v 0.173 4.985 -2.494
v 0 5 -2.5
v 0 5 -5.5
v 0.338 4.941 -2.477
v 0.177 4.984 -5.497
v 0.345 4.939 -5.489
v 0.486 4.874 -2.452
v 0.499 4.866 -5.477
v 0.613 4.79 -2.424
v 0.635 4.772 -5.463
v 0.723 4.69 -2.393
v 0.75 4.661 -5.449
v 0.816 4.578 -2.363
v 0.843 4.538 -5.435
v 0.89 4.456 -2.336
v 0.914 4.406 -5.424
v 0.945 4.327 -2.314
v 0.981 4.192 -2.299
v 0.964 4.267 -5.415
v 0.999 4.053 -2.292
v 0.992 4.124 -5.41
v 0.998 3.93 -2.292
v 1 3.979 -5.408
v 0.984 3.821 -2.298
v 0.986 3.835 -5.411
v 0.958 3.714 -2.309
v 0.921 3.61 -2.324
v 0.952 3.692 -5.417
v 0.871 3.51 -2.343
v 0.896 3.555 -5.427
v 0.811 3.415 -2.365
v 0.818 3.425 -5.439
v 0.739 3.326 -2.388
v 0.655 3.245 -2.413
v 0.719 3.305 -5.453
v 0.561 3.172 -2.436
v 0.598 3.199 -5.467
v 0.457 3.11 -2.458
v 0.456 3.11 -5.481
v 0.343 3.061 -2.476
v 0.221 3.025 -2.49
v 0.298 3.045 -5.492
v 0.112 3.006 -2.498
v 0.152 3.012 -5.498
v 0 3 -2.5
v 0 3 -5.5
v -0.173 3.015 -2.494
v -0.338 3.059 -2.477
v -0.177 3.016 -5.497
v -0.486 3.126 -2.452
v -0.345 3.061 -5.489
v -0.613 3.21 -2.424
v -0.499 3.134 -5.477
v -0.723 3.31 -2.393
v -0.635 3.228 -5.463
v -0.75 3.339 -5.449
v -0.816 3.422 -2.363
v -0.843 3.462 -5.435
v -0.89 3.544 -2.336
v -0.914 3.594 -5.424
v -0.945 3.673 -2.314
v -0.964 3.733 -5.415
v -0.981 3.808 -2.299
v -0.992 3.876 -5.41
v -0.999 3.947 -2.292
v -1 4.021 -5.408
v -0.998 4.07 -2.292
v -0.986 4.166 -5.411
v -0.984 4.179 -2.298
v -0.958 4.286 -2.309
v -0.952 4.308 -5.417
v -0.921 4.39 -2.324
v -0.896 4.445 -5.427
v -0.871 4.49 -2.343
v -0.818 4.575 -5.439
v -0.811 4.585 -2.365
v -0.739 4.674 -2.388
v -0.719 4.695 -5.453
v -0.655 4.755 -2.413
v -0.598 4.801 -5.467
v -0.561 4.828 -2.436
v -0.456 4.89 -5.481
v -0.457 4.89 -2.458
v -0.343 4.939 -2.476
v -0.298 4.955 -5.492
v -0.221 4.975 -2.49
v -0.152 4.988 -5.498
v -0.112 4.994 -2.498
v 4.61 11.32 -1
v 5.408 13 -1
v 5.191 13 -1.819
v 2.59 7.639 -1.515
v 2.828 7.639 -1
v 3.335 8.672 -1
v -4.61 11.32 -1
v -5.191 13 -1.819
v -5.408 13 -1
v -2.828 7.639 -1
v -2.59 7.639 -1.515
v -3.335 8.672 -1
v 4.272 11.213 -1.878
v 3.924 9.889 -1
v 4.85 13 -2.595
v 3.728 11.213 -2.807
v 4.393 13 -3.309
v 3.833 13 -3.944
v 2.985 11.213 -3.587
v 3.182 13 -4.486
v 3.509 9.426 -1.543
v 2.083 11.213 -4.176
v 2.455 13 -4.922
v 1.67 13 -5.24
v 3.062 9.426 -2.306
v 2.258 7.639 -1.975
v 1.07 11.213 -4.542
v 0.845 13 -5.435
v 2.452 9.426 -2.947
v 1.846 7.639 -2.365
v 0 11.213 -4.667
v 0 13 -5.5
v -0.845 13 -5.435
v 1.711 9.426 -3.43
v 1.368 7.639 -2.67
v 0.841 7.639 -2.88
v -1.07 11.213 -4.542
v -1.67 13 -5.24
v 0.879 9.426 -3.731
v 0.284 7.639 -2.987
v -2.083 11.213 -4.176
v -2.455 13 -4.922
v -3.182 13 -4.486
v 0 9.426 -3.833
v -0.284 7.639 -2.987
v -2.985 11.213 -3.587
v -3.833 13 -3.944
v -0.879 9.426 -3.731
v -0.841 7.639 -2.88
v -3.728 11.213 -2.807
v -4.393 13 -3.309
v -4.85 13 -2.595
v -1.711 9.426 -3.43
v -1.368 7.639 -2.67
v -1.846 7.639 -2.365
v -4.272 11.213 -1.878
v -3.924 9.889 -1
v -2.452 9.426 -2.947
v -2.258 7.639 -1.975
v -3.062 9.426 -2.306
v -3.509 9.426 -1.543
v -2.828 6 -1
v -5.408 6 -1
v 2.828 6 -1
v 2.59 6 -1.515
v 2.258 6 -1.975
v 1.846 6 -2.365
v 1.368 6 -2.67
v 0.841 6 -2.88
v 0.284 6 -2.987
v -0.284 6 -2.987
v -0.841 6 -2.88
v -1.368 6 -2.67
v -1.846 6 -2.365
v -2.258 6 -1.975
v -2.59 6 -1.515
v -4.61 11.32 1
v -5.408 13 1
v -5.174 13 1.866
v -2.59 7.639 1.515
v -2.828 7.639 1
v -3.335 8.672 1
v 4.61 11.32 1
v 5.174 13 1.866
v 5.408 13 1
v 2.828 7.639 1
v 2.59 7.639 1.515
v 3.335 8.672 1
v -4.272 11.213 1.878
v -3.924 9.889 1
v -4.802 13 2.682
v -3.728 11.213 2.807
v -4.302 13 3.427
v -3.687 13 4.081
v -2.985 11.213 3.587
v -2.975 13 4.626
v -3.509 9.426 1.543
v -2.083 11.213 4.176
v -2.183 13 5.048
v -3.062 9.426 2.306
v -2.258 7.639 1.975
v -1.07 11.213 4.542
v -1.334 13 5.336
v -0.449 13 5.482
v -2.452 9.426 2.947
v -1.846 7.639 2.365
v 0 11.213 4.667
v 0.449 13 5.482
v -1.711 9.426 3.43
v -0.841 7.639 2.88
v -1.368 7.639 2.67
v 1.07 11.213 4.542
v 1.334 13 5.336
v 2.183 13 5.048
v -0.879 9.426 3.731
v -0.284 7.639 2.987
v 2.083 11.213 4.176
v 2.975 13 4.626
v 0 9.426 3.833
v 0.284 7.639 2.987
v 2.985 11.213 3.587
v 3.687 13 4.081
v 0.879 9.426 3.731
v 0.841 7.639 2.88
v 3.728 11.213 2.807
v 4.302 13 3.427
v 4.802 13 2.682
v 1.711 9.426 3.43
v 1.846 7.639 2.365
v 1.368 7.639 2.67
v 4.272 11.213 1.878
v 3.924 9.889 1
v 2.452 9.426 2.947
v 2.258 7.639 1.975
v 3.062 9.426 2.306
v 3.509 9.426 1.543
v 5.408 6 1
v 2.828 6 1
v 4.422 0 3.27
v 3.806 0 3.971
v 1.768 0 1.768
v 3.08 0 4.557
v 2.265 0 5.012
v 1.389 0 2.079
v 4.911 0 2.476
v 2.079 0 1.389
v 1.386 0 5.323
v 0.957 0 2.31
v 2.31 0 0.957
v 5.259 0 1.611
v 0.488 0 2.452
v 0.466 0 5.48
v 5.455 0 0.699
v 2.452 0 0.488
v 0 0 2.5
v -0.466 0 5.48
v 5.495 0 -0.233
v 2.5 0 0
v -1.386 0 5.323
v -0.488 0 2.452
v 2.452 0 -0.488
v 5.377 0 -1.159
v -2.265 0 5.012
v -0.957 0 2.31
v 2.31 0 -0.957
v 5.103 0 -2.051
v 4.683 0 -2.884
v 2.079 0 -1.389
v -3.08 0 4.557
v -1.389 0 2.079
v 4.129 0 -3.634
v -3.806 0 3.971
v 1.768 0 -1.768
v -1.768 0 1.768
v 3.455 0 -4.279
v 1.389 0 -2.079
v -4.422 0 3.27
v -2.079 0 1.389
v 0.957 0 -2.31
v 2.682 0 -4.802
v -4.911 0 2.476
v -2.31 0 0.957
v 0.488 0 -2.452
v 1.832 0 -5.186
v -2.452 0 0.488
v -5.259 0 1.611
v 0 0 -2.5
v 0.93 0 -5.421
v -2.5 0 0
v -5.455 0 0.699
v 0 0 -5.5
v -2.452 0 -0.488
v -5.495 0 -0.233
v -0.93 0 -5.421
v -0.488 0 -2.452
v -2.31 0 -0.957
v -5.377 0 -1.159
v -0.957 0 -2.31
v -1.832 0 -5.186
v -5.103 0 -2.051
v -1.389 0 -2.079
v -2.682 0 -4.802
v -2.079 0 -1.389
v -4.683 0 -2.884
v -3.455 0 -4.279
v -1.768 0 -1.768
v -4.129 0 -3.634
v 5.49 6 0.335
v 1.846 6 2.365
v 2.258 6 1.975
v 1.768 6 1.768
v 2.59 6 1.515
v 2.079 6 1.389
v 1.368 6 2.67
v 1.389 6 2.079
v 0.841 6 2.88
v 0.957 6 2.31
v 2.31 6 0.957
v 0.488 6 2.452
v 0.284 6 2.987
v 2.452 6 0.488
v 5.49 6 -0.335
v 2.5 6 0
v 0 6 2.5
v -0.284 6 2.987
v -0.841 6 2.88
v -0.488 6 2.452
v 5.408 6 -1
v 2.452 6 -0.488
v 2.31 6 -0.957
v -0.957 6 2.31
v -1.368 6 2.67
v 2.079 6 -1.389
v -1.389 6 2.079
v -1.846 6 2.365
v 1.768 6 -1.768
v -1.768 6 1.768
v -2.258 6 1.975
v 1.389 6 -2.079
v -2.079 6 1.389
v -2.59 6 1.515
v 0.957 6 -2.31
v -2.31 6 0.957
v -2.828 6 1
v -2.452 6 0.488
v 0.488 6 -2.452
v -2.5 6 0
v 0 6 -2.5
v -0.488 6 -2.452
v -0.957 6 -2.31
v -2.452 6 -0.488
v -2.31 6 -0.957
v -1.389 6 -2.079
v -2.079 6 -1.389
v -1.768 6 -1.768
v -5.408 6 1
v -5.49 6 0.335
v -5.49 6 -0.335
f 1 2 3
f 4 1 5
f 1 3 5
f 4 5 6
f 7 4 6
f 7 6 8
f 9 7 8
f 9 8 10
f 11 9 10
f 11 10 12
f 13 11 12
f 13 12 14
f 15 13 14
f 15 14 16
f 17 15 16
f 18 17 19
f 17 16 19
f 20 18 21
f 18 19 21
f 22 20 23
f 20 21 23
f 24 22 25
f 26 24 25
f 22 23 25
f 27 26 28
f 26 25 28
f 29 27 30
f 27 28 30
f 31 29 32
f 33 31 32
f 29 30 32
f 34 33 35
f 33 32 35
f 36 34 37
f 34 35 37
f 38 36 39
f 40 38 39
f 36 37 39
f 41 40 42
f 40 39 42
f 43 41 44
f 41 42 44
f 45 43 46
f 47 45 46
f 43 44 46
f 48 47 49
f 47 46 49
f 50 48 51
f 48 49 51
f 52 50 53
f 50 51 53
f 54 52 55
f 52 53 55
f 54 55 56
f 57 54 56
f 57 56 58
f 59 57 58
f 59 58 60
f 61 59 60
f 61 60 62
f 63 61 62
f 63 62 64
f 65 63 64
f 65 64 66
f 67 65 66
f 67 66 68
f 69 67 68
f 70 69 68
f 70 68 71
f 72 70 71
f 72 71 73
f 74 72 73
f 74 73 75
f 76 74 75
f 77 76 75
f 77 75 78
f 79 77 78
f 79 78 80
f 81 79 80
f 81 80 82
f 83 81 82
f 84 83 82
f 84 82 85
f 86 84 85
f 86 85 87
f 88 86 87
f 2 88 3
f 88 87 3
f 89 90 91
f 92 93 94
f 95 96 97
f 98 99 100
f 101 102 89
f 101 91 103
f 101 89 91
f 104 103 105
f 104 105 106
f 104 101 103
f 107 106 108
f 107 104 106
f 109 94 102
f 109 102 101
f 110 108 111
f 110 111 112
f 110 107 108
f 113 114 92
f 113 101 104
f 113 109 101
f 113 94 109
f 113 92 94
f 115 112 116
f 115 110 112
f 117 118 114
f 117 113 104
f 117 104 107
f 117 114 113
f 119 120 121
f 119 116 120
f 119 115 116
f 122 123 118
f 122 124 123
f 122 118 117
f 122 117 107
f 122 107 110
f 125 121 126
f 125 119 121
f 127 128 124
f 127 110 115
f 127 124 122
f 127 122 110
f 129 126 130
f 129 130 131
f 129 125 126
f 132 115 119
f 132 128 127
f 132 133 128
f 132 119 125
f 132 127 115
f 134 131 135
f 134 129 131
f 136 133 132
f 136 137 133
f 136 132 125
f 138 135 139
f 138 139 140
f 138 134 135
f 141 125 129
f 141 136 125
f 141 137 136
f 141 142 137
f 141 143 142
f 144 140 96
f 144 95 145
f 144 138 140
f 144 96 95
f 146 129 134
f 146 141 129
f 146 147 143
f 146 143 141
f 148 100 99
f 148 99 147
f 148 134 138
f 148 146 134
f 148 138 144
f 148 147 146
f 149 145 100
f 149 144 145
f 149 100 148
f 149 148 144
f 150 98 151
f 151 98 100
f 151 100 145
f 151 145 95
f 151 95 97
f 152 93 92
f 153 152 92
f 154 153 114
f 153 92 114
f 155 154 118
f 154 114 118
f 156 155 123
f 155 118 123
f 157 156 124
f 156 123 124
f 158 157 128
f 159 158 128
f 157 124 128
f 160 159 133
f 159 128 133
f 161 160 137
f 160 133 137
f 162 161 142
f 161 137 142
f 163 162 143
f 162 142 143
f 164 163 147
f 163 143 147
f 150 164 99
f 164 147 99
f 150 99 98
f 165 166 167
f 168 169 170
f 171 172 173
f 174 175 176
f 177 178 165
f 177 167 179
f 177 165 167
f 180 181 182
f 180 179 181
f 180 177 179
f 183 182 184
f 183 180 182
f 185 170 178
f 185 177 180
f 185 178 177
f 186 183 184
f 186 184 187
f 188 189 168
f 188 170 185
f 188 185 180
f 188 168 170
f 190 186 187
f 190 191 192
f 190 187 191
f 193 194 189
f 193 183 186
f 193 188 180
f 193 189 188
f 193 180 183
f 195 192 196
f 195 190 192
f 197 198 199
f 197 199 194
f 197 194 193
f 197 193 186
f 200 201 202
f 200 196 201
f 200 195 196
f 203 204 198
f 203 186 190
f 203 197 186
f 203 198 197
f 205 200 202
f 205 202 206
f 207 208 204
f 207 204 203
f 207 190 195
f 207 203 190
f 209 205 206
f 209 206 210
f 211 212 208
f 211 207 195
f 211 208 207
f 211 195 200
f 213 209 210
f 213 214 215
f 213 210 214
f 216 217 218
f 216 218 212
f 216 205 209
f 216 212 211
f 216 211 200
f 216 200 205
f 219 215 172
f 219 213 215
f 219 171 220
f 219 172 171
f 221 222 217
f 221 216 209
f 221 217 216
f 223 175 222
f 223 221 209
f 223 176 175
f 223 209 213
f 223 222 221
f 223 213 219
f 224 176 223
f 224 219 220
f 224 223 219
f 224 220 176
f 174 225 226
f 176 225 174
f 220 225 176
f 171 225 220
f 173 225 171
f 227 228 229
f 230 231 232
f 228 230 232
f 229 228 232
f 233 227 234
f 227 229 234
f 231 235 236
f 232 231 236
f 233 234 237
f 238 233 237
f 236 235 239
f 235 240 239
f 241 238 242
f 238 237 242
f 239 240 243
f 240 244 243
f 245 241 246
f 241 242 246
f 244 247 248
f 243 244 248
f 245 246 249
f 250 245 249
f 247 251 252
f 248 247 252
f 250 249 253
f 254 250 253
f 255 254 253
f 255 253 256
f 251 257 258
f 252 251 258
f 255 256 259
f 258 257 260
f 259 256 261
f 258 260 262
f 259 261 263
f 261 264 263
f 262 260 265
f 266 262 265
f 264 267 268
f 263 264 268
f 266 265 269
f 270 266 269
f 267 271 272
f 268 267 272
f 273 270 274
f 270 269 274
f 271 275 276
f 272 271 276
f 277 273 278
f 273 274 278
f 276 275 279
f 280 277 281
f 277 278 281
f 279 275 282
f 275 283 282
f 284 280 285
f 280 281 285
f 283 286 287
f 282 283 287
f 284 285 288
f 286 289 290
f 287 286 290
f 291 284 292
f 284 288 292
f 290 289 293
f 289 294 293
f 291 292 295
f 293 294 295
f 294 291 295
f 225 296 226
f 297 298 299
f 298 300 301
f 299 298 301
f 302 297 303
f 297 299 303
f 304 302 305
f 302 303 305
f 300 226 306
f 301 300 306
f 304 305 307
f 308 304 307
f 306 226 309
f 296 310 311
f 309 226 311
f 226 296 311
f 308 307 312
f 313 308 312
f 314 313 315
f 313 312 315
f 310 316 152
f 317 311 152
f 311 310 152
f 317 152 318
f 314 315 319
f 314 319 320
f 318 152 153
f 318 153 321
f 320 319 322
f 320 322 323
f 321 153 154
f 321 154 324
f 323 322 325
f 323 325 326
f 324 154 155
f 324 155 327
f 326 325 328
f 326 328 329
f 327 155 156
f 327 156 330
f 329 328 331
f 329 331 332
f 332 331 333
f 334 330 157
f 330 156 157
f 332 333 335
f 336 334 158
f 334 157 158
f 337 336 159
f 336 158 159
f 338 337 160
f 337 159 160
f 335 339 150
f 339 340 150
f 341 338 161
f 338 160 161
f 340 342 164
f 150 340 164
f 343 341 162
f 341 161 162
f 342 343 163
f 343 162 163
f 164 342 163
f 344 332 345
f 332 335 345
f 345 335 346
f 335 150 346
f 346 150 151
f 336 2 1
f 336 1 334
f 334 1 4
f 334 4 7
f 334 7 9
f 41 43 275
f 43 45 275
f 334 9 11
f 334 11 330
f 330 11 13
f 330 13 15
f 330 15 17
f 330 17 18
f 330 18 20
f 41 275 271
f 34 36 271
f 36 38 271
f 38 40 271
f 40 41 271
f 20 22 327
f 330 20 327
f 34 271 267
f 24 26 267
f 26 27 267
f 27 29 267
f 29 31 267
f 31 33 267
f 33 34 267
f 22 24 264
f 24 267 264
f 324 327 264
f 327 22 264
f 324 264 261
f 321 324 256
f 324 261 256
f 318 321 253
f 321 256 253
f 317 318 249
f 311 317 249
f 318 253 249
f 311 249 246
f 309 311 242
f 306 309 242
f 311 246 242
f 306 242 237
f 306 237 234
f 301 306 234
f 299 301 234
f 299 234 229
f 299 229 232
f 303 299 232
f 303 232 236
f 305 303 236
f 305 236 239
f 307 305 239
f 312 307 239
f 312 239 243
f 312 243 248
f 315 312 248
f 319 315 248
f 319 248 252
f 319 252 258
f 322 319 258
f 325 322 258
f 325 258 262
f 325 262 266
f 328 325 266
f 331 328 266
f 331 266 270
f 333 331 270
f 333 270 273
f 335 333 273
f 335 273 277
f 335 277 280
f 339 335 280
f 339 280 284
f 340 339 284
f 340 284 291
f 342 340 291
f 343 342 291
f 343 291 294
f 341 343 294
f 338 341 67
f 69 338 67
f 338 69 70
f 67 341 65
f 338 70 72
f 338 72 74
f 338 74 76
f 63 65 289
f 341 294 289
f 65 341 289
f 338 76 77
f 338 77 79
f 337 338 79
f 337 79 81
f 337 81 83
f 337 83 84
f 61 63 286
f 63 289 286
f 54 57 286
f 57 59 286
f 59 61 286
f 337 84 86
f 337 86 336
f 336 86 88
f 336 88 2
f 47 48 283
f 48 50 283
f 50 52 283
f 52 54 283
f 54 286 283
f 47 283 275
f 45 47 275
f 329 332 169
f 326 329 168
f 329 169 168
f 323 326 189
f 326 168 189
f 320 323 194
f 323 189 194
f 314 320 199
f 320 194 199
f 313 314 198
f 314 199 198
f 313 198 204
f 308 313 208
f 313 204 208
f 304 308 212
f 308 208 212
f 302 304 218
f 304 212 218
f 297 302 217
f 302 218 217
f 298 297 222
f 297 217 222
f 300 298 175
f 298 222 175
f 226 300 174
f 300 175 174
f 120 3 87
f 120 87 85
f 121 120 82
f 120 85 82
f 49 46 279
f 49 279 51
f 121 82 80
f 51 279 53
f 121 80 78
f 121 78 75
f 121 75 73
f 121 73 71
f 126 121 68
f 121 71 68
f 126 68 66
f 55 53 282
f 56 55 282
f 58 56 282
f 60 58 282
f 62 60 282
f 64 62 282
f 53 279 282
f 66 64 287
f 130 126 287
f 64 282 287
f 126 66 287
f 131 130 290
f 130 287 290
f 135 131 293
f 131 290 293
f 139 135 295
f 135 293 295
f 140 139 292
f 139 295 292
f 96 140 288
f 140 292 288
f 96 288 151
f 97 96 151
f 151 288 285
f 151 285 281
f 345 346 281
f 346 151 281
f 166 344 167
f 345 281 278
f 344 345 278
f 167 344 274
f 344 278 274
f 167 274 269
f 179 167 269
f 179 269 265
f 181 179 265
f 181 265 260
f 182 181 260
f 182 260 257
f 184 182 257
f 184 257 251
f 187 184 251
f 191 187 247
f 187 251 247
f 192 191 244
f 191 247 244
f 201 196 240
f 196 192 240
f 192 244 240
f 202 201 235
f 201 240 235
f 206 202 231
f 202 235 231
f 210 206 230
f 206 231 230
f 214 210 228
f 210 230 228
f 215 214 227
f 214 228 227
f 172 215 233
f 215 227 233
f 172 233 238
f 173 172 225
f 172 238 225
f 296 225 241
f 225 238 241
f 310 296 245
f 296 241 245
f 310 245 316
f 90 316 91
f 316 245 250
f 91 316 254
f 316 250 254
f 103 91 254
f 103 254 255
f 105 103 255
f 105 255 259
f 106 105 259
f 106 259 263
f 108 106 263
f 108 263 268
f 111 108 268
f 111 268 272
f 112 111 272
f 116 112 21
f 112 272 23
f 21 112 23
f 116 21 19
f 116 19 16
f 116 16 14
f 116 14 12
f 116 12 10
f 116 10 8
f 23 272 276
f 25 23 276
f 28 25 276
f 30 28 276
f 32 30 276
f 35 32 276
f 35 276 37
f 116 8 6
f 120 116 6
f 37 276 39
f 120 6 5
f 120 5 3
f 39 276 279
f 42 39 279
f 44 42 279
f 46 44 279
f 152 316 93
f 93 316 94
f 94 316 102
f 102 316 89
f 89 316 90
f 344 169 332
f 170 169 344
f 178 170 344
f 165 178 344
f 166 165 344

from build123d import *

# Parameters (mm, degrees)
SKETCH1_R           = 5.5
BOSS_EXTRUDE1_DEPTH = 13
SKETCH2_R           = 3
CUT_EXTRUDE1_DEPTH  = 7
CHAMFER1_SIZE       = 2.5
CHAMFER1_SIZE_2     = 5.361267301
SKETCH3_W           = 11.617421712
SKETCH3_H           = 2
CUT_EXTRUDE2_DEPTH  = 7
SKETCH4_R           = 2.5
CUT_EXTRUDE3_DEPTH  = 7
SKETCH5_R           = 1
CUT_EXTRUDE5_DEPTH  = 4


with BuildPart() as part:
    # Sketch1 → Boss-Extrude1 (new body)
    with BuildSketch(Plane(origin=(0, 0, 0), x_dir=(1, 0, 0), z_dir=(0, 1, 0))):
        with Locations(Location((0, 0, 0), (0, 0, 90))):
            Circle(SKETCH1_R)
    extrude(amount=BOSS_EXTRUDE1_DEPTH)

    # Sketch2 → Cut-Extrude1 (cut)
    with BuildSketch(Plane(origin=(0, 13, 0), x_dir=(1, 0, 0), z_dir=(0, 1, 0))):
        with Locations(Location((0, 0, 0), (0, 0, 270))):
            Circle(SKETCH2_R)
    extrude(amount=-CUT_EXTRUDE1_DEPTH, mode=Mode.SUBTRACT)

    # Chamfer1
    # the kernel refuses this chamfer: 5.361267301, 2.5 mm, written as the material it takes off along each edge
    with BuildSketch(Plane(origin=(0, 13, 0), x_dir=(0, 0, 1), z_dir=(-1, 0, 0))) as chamfer1_piece_1:
        Polygon((3 + CHAMFER1_SIZE, 0), (3, -CHAMFER1_SIZE_2), (3, 0), align=None)
    revolve(axis=Axis((0, 13, 0), (0, 1, 0)), mode=Mode.SUBTRACT)

    # Sketch3 → Cut-Extrude2 (cut)
    with BuildSketch(Plane(origin=(0, 13, 0), x_dir=(-1, 0, 0), z_dir=(0, -1, 0))):
        Rectangle(SKETCH3_W, SKETCH3_H)
    extrude(amount=CUT_EXTRUDE2_DEPTH, mode=Mode.SUBTRACT)

    # Sketch4 → Cut-Extrude3 (cut)
    with BuildSketch(Plane.XZ):
        with Locations(Location((0, 0, 0), (0, 0, 270))):
            Circle(SKETCH4_R)
    extrude(amount=-CUT_EXTRUDE3_DEPTH, mode=Mode.SUBTRACT)

    # Sketch5 → Cut-Extrude5 (cut)
    with BuildSketch(Plane(origin=(0, 0, -5.5), x_dir=(-1, 0, 0), z_dir=(0, 0, -1))):
        with Locations(Location((0, 4, 0), (0, 0, 90))):
            Circle(SKETCH5_R)
    extrude(amount=-CUT_EXTRUDE5_DEPTH, mode=Mode.SUBTRACT)


solid = part.part
